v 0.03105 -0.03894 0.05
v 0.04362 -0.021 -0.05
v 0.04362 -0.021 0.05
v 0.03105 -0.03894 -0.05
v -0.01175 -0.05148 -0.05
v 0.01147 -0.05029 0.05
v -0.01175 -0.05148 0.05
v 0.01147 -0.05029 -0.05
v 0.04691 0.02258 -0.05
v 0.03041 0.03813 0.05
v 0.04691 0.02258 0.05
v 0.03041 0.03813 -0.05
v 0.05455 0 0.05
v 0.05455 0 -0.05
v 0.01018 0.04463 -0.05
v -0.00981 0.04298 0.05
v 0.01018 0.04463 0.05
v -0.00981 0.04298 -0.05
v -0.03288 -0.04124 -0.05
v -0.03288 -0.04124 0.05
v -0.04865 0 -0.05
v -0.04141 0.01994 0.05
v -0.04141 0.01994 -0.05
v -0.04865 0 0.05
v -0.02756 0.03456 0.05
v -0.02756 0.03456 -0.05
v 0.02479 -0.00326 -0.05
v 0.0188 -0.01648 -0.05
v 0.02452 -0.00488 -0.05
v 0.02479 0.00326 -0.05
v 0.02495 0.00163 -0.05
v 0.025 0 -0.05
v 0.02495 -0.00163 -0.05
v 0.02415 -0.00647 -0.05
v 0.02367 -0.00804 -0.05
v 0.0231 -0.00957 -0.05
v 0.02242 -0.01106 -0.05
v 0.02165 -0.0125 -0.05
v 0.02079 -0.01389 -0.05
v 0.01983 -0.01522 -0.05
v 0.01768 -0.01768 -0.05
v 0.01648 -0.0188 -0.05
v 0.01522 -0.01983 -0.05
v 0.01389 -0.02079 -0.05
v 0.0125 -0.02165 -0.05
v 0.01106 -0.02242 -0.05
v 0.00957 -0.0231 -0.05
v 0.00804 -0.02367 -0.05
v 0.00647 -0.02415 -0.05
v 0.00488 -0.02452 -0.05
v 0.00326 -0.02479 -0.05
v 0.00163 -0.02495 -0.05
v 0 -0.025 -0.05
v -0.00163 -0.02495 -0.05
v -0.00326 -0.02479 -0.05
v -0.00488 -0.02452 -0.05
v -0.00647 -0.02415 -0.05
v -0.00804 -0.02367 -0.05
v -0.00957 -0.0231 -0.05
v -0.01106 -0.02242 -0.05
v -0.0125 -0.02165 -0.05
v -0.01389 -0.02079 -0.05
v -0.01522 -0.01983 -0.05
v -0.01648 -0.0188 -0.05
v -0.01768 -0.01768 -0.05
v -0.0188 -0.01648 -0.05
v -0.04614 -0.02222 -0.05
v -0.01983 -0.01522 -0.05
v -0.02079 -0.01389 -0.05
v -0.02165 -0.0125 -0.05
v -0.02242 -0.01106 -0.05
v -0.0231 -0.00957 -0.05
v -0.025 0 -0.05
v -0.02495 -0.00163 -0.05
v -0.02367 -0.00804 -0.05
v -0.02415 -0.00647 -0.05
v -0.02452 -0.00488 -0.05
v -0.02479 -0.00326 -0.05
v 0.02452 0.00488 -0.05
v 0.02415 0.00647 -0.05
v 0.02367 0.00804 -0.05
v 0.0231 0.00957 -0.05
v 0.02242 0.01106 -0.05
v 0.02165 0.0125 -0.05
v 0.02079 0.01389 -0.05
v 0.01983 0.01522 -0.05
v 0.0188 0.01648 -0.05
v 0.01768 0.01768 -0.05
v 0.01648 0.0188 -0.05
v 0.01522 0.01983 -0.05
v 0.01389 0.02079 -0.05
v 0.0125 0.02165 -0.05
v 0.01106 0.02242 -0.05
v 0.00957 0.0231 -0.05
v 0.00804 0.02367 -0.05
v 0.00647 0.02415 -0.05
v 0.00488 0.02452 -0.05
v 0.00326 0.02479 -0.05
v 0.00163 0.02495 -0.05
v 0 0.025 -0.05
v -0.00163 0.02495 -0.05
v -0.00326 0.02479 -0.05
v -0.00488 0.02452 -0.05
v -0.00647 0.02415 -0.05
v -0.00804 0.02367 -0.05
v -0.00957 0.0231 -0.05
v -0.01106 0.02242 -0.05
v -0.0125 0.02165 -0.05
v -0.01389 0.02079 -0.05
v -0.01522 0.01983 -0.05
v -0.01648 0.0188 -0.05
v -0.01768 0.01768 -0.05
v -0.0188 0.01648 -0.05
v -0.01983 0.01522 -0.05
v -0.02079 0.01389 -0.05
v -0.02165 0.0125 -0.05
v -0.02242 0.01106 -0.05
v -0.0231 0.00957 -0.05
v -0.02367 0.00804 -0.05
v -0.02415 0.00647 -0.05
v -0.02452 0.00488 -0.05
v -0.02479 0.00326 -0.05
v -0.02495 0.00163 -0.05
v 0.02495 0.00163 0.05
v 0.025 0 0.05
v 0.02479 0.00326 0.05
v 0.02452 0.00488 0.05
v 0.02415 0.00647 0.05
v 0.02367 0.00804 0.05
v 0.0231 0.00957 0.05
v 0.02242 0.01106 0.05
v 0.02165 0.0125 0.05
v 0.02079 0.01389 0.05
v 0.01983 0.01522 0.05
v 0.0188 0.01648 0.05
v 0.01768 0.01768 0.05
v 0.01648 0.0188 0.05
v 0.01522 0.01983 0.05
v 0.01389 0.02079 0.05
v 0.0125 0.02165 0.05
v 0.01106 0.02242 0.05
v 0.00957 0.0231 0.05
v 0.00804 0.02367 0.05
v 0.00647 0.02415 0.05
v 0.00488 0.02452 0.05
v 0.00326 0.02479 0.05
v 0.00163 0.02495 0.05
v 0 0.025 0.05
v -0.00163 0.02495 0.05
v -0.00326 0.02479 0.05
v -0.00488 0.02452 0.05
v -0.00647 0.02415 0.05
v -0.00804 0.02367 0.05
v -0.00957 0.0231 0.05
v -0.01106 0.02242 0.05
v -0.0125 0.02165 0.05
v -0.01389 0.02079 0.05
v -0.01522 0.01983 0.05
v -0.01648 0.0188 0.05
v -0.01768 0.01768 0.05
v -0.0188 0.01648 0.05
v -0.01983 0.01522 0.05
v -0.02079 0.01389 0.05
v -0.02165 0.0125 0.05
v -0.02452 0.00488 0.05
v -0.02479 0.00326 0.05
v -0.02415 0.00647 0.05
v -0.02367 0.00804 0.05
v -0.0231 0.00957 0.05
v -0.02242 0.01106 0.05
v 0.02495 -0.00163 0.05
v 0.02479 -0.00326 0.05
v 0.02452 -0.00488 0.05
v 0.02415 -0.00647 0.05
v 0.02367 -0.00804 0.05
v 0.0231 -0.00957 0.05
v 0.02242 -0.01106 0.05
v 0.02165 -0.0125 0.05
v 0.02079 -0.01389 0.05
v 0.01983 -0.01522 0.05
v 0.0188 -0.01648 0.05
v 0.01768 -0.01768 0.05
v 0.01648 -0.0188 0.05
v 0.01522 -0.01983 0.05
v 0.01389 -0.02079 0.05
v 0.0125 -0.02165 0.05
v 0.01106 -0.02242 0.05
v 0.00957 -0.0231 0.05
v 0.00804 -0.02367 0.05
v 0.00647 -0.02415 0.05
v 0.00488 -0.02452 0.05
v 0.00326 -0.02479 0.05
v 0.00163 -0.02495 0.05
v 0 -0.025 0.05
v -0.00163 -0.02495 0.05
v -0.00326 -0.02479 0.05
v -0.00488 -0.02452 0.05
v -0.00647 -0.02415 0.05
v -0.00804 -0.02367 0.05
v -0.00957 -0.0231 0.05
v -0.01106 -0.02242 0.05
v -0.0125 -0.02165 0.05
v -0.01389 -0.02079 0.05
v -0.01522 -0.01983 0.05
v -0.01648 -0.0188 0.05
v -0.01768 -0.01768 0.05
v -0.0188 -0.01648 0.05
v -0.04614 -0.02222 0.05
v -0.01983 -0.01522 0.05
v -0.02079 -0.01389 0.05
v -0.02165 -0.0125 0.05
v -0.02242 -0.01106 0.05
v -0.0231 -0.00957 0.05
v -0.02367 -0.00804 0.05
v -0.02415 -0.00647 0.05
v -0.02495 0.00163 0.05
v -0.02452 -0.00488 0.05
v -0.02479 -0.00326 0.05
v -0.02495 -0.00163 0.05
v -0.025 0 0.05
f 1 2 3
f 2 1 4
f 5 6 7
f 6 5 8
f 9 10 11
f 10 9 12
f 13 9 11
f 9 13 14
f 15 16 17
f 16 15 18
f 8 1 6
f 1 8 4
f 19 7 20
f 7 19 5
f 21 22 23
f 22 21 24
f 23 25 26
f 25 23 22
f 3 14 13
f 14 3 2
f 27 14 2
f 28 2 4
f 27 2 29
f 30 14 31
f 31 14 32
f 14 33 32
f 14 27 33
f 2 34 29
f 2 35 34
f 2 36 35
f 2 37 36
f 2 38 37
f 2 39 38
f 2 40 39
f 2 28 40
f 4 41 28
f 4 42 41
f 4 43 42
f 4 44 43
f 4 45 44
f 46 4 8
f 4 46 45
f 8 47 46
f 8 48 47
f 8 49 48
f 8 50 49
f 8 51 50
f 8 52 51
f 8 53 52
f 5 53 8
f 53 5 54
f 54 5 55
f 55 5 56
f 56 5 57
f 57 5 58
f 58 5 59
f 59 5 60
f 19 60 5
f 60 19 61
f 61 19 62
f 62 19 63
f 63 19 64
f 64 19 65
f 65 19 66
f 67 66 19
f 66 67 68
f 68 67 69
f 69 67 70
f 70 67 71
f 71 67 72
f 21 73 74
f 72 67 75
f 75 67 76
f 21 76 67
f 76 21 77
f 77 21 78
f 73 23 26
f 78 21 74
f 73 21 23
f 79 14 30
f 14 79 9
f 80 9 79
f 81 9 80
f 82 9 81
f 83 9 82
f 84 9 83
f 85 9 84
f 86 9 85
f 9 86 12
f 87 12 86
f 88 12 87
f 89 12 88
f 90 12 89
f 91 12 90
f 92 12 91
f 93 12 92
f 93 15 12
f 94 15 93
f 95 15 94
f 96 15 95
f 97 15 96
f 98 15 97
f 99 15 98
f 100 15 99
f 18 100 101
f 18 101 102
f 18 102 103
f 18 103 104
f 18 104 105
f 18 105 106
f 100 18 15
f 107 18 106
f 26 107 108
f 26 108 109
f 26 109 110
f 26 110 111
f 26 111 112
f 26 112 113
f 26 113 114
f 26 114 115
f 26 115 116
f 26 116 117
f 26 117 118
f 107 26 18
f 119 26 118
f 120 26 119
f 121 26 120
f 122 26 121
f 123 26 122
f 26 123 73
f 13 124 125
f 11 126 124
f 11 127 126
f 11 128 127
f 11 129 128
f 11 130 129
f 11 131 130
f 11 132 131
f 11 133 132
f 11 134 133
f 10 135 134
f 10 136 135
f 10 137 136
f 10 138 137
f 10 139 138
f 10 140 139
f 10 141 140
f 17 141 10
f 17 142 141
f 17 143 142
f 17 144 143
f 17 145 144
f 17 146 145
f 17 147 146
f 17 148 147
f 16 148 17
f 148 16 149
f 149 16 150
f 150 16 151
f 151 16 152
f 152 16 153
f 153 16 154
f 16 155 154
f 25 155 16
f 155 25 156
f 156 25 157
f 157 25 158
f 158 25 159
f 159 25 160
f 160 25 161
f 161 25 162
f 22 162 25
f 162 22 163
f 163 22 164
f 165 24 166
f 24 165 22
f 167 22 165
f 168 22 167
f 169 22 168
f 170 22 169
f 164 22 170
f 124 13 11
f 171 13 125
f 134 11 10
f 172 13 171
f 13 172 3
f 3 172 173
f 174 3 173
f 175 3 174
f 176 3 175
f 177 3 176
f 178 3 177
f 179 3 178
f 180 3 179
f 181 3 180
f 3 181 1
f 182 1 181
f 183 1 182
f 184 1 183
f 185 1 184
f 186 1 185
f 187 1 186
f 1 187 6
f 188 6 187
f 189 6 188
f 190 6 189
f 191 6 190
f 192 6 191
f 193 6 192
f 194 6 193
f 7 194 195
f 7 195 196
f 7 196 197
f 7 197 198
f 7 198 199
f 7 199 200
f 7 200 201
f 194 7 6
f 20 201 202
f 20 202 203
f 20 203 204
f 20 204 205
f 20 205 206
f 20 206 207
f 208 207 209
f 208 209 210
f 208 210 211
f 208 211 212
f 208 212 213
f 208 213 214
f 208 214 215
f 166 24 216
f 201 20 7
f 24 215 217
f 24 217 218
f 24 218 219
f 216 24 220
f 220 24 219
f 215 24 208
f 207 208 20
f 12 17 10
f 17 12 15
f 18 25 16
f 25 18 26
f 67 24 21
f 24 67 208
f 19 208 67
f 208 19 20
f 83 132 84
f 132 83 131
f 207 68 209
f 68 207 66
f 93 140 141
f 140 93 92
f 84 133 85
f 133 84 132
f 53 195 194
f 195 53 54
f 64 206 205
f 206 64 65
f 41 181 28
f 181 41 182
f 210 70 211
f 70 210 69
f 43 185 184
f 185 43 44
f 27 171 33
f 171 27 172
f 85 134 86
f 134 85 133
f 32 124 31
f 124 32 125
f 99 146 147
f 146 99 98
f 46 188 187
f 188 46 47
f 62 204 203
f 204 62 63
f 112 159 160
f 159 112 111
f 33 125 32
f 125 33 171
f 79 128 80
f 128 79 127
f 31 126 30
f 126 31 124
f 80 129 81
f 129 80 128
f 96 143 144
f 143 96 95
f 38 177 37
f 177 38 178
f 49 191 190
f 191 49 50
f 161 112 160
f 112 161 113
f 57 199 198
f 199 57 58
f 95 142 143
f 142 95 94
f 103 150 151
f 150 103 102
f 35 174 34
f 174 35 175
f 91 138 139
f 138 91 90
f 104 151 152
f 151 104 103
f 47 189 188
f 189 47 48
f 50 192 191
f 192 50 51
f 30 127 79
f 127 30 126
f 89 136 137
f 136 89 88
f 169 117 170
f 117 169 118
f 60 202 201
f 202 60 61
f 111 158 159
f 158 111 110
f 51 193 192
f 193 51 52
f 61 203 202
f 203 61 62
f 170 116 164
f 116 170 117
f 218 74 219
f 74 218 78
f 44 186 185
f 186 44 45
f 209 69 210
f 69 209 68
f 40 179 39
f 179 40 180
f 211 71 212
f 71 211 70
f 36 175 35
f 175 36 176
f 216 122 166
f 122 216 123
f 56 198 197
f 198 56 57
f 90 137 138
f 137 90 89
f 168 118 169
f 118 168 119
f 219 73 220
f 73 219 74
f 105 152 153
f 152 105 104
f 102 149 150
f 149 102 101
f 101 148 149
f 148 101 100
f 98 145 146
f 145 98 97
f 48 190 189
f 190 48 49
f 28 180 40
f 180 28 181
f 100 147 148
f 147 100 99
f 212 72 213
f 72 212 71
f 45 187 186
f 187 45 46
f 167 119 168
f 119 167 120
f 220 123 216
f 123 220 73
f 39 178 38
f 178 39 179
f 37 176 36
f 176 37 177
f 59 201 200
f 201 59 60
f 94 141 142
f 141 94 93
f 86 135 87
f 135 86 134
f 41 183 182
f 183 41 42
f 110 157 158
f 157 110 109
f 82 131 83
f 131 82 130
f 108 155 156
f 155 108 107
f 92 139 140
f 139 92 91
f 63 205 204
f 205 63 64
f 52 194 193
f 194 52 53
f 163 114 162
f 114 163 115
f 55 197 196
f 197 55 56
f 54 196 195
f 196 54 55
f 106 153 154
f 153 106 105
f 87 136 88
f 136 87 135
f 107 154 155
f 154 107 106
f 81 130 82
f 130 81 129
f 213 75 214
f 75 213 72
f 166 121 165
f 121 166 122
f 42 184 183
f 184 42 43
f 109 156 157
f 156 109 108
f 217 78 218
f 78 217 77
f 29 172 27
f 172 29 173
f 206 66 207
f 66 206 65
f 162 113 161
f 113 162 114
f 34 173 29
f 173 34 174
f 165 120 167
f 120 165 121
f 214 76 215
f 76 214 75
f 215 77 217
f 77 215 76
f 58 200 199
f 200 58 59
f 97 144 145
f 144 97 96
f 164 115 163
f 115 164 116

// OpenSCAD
$fn=64;

outer_d = 0.1;
inner_d = 0.05;
h = 0.1;

facets = 14;
irreg_amp = 0.004;
seed = 7;

module faceted_outer_profile(od=outer_d, n=facets, amp=irreg_amp, s=seed){
    pts = [
        for (i = [0:n-1]) 
            let(a = 360*i/n)
            let(r = od/2 + amp*(sin((i+1)*37 + s*11) + 0.6*cos((i+1)*19 + s*7)))
            [r*cos(a), r*sin(a)]
    ];
    polygon(points=pts);
}

module ring(){
    difference(){
        linear_extrude(height=h, center=true, convexity=10)
            faceted_outer_profile();
        cylinder(d=inner_d, h=h+0.02, center=true, $fn=96);
    }
}

ring();
